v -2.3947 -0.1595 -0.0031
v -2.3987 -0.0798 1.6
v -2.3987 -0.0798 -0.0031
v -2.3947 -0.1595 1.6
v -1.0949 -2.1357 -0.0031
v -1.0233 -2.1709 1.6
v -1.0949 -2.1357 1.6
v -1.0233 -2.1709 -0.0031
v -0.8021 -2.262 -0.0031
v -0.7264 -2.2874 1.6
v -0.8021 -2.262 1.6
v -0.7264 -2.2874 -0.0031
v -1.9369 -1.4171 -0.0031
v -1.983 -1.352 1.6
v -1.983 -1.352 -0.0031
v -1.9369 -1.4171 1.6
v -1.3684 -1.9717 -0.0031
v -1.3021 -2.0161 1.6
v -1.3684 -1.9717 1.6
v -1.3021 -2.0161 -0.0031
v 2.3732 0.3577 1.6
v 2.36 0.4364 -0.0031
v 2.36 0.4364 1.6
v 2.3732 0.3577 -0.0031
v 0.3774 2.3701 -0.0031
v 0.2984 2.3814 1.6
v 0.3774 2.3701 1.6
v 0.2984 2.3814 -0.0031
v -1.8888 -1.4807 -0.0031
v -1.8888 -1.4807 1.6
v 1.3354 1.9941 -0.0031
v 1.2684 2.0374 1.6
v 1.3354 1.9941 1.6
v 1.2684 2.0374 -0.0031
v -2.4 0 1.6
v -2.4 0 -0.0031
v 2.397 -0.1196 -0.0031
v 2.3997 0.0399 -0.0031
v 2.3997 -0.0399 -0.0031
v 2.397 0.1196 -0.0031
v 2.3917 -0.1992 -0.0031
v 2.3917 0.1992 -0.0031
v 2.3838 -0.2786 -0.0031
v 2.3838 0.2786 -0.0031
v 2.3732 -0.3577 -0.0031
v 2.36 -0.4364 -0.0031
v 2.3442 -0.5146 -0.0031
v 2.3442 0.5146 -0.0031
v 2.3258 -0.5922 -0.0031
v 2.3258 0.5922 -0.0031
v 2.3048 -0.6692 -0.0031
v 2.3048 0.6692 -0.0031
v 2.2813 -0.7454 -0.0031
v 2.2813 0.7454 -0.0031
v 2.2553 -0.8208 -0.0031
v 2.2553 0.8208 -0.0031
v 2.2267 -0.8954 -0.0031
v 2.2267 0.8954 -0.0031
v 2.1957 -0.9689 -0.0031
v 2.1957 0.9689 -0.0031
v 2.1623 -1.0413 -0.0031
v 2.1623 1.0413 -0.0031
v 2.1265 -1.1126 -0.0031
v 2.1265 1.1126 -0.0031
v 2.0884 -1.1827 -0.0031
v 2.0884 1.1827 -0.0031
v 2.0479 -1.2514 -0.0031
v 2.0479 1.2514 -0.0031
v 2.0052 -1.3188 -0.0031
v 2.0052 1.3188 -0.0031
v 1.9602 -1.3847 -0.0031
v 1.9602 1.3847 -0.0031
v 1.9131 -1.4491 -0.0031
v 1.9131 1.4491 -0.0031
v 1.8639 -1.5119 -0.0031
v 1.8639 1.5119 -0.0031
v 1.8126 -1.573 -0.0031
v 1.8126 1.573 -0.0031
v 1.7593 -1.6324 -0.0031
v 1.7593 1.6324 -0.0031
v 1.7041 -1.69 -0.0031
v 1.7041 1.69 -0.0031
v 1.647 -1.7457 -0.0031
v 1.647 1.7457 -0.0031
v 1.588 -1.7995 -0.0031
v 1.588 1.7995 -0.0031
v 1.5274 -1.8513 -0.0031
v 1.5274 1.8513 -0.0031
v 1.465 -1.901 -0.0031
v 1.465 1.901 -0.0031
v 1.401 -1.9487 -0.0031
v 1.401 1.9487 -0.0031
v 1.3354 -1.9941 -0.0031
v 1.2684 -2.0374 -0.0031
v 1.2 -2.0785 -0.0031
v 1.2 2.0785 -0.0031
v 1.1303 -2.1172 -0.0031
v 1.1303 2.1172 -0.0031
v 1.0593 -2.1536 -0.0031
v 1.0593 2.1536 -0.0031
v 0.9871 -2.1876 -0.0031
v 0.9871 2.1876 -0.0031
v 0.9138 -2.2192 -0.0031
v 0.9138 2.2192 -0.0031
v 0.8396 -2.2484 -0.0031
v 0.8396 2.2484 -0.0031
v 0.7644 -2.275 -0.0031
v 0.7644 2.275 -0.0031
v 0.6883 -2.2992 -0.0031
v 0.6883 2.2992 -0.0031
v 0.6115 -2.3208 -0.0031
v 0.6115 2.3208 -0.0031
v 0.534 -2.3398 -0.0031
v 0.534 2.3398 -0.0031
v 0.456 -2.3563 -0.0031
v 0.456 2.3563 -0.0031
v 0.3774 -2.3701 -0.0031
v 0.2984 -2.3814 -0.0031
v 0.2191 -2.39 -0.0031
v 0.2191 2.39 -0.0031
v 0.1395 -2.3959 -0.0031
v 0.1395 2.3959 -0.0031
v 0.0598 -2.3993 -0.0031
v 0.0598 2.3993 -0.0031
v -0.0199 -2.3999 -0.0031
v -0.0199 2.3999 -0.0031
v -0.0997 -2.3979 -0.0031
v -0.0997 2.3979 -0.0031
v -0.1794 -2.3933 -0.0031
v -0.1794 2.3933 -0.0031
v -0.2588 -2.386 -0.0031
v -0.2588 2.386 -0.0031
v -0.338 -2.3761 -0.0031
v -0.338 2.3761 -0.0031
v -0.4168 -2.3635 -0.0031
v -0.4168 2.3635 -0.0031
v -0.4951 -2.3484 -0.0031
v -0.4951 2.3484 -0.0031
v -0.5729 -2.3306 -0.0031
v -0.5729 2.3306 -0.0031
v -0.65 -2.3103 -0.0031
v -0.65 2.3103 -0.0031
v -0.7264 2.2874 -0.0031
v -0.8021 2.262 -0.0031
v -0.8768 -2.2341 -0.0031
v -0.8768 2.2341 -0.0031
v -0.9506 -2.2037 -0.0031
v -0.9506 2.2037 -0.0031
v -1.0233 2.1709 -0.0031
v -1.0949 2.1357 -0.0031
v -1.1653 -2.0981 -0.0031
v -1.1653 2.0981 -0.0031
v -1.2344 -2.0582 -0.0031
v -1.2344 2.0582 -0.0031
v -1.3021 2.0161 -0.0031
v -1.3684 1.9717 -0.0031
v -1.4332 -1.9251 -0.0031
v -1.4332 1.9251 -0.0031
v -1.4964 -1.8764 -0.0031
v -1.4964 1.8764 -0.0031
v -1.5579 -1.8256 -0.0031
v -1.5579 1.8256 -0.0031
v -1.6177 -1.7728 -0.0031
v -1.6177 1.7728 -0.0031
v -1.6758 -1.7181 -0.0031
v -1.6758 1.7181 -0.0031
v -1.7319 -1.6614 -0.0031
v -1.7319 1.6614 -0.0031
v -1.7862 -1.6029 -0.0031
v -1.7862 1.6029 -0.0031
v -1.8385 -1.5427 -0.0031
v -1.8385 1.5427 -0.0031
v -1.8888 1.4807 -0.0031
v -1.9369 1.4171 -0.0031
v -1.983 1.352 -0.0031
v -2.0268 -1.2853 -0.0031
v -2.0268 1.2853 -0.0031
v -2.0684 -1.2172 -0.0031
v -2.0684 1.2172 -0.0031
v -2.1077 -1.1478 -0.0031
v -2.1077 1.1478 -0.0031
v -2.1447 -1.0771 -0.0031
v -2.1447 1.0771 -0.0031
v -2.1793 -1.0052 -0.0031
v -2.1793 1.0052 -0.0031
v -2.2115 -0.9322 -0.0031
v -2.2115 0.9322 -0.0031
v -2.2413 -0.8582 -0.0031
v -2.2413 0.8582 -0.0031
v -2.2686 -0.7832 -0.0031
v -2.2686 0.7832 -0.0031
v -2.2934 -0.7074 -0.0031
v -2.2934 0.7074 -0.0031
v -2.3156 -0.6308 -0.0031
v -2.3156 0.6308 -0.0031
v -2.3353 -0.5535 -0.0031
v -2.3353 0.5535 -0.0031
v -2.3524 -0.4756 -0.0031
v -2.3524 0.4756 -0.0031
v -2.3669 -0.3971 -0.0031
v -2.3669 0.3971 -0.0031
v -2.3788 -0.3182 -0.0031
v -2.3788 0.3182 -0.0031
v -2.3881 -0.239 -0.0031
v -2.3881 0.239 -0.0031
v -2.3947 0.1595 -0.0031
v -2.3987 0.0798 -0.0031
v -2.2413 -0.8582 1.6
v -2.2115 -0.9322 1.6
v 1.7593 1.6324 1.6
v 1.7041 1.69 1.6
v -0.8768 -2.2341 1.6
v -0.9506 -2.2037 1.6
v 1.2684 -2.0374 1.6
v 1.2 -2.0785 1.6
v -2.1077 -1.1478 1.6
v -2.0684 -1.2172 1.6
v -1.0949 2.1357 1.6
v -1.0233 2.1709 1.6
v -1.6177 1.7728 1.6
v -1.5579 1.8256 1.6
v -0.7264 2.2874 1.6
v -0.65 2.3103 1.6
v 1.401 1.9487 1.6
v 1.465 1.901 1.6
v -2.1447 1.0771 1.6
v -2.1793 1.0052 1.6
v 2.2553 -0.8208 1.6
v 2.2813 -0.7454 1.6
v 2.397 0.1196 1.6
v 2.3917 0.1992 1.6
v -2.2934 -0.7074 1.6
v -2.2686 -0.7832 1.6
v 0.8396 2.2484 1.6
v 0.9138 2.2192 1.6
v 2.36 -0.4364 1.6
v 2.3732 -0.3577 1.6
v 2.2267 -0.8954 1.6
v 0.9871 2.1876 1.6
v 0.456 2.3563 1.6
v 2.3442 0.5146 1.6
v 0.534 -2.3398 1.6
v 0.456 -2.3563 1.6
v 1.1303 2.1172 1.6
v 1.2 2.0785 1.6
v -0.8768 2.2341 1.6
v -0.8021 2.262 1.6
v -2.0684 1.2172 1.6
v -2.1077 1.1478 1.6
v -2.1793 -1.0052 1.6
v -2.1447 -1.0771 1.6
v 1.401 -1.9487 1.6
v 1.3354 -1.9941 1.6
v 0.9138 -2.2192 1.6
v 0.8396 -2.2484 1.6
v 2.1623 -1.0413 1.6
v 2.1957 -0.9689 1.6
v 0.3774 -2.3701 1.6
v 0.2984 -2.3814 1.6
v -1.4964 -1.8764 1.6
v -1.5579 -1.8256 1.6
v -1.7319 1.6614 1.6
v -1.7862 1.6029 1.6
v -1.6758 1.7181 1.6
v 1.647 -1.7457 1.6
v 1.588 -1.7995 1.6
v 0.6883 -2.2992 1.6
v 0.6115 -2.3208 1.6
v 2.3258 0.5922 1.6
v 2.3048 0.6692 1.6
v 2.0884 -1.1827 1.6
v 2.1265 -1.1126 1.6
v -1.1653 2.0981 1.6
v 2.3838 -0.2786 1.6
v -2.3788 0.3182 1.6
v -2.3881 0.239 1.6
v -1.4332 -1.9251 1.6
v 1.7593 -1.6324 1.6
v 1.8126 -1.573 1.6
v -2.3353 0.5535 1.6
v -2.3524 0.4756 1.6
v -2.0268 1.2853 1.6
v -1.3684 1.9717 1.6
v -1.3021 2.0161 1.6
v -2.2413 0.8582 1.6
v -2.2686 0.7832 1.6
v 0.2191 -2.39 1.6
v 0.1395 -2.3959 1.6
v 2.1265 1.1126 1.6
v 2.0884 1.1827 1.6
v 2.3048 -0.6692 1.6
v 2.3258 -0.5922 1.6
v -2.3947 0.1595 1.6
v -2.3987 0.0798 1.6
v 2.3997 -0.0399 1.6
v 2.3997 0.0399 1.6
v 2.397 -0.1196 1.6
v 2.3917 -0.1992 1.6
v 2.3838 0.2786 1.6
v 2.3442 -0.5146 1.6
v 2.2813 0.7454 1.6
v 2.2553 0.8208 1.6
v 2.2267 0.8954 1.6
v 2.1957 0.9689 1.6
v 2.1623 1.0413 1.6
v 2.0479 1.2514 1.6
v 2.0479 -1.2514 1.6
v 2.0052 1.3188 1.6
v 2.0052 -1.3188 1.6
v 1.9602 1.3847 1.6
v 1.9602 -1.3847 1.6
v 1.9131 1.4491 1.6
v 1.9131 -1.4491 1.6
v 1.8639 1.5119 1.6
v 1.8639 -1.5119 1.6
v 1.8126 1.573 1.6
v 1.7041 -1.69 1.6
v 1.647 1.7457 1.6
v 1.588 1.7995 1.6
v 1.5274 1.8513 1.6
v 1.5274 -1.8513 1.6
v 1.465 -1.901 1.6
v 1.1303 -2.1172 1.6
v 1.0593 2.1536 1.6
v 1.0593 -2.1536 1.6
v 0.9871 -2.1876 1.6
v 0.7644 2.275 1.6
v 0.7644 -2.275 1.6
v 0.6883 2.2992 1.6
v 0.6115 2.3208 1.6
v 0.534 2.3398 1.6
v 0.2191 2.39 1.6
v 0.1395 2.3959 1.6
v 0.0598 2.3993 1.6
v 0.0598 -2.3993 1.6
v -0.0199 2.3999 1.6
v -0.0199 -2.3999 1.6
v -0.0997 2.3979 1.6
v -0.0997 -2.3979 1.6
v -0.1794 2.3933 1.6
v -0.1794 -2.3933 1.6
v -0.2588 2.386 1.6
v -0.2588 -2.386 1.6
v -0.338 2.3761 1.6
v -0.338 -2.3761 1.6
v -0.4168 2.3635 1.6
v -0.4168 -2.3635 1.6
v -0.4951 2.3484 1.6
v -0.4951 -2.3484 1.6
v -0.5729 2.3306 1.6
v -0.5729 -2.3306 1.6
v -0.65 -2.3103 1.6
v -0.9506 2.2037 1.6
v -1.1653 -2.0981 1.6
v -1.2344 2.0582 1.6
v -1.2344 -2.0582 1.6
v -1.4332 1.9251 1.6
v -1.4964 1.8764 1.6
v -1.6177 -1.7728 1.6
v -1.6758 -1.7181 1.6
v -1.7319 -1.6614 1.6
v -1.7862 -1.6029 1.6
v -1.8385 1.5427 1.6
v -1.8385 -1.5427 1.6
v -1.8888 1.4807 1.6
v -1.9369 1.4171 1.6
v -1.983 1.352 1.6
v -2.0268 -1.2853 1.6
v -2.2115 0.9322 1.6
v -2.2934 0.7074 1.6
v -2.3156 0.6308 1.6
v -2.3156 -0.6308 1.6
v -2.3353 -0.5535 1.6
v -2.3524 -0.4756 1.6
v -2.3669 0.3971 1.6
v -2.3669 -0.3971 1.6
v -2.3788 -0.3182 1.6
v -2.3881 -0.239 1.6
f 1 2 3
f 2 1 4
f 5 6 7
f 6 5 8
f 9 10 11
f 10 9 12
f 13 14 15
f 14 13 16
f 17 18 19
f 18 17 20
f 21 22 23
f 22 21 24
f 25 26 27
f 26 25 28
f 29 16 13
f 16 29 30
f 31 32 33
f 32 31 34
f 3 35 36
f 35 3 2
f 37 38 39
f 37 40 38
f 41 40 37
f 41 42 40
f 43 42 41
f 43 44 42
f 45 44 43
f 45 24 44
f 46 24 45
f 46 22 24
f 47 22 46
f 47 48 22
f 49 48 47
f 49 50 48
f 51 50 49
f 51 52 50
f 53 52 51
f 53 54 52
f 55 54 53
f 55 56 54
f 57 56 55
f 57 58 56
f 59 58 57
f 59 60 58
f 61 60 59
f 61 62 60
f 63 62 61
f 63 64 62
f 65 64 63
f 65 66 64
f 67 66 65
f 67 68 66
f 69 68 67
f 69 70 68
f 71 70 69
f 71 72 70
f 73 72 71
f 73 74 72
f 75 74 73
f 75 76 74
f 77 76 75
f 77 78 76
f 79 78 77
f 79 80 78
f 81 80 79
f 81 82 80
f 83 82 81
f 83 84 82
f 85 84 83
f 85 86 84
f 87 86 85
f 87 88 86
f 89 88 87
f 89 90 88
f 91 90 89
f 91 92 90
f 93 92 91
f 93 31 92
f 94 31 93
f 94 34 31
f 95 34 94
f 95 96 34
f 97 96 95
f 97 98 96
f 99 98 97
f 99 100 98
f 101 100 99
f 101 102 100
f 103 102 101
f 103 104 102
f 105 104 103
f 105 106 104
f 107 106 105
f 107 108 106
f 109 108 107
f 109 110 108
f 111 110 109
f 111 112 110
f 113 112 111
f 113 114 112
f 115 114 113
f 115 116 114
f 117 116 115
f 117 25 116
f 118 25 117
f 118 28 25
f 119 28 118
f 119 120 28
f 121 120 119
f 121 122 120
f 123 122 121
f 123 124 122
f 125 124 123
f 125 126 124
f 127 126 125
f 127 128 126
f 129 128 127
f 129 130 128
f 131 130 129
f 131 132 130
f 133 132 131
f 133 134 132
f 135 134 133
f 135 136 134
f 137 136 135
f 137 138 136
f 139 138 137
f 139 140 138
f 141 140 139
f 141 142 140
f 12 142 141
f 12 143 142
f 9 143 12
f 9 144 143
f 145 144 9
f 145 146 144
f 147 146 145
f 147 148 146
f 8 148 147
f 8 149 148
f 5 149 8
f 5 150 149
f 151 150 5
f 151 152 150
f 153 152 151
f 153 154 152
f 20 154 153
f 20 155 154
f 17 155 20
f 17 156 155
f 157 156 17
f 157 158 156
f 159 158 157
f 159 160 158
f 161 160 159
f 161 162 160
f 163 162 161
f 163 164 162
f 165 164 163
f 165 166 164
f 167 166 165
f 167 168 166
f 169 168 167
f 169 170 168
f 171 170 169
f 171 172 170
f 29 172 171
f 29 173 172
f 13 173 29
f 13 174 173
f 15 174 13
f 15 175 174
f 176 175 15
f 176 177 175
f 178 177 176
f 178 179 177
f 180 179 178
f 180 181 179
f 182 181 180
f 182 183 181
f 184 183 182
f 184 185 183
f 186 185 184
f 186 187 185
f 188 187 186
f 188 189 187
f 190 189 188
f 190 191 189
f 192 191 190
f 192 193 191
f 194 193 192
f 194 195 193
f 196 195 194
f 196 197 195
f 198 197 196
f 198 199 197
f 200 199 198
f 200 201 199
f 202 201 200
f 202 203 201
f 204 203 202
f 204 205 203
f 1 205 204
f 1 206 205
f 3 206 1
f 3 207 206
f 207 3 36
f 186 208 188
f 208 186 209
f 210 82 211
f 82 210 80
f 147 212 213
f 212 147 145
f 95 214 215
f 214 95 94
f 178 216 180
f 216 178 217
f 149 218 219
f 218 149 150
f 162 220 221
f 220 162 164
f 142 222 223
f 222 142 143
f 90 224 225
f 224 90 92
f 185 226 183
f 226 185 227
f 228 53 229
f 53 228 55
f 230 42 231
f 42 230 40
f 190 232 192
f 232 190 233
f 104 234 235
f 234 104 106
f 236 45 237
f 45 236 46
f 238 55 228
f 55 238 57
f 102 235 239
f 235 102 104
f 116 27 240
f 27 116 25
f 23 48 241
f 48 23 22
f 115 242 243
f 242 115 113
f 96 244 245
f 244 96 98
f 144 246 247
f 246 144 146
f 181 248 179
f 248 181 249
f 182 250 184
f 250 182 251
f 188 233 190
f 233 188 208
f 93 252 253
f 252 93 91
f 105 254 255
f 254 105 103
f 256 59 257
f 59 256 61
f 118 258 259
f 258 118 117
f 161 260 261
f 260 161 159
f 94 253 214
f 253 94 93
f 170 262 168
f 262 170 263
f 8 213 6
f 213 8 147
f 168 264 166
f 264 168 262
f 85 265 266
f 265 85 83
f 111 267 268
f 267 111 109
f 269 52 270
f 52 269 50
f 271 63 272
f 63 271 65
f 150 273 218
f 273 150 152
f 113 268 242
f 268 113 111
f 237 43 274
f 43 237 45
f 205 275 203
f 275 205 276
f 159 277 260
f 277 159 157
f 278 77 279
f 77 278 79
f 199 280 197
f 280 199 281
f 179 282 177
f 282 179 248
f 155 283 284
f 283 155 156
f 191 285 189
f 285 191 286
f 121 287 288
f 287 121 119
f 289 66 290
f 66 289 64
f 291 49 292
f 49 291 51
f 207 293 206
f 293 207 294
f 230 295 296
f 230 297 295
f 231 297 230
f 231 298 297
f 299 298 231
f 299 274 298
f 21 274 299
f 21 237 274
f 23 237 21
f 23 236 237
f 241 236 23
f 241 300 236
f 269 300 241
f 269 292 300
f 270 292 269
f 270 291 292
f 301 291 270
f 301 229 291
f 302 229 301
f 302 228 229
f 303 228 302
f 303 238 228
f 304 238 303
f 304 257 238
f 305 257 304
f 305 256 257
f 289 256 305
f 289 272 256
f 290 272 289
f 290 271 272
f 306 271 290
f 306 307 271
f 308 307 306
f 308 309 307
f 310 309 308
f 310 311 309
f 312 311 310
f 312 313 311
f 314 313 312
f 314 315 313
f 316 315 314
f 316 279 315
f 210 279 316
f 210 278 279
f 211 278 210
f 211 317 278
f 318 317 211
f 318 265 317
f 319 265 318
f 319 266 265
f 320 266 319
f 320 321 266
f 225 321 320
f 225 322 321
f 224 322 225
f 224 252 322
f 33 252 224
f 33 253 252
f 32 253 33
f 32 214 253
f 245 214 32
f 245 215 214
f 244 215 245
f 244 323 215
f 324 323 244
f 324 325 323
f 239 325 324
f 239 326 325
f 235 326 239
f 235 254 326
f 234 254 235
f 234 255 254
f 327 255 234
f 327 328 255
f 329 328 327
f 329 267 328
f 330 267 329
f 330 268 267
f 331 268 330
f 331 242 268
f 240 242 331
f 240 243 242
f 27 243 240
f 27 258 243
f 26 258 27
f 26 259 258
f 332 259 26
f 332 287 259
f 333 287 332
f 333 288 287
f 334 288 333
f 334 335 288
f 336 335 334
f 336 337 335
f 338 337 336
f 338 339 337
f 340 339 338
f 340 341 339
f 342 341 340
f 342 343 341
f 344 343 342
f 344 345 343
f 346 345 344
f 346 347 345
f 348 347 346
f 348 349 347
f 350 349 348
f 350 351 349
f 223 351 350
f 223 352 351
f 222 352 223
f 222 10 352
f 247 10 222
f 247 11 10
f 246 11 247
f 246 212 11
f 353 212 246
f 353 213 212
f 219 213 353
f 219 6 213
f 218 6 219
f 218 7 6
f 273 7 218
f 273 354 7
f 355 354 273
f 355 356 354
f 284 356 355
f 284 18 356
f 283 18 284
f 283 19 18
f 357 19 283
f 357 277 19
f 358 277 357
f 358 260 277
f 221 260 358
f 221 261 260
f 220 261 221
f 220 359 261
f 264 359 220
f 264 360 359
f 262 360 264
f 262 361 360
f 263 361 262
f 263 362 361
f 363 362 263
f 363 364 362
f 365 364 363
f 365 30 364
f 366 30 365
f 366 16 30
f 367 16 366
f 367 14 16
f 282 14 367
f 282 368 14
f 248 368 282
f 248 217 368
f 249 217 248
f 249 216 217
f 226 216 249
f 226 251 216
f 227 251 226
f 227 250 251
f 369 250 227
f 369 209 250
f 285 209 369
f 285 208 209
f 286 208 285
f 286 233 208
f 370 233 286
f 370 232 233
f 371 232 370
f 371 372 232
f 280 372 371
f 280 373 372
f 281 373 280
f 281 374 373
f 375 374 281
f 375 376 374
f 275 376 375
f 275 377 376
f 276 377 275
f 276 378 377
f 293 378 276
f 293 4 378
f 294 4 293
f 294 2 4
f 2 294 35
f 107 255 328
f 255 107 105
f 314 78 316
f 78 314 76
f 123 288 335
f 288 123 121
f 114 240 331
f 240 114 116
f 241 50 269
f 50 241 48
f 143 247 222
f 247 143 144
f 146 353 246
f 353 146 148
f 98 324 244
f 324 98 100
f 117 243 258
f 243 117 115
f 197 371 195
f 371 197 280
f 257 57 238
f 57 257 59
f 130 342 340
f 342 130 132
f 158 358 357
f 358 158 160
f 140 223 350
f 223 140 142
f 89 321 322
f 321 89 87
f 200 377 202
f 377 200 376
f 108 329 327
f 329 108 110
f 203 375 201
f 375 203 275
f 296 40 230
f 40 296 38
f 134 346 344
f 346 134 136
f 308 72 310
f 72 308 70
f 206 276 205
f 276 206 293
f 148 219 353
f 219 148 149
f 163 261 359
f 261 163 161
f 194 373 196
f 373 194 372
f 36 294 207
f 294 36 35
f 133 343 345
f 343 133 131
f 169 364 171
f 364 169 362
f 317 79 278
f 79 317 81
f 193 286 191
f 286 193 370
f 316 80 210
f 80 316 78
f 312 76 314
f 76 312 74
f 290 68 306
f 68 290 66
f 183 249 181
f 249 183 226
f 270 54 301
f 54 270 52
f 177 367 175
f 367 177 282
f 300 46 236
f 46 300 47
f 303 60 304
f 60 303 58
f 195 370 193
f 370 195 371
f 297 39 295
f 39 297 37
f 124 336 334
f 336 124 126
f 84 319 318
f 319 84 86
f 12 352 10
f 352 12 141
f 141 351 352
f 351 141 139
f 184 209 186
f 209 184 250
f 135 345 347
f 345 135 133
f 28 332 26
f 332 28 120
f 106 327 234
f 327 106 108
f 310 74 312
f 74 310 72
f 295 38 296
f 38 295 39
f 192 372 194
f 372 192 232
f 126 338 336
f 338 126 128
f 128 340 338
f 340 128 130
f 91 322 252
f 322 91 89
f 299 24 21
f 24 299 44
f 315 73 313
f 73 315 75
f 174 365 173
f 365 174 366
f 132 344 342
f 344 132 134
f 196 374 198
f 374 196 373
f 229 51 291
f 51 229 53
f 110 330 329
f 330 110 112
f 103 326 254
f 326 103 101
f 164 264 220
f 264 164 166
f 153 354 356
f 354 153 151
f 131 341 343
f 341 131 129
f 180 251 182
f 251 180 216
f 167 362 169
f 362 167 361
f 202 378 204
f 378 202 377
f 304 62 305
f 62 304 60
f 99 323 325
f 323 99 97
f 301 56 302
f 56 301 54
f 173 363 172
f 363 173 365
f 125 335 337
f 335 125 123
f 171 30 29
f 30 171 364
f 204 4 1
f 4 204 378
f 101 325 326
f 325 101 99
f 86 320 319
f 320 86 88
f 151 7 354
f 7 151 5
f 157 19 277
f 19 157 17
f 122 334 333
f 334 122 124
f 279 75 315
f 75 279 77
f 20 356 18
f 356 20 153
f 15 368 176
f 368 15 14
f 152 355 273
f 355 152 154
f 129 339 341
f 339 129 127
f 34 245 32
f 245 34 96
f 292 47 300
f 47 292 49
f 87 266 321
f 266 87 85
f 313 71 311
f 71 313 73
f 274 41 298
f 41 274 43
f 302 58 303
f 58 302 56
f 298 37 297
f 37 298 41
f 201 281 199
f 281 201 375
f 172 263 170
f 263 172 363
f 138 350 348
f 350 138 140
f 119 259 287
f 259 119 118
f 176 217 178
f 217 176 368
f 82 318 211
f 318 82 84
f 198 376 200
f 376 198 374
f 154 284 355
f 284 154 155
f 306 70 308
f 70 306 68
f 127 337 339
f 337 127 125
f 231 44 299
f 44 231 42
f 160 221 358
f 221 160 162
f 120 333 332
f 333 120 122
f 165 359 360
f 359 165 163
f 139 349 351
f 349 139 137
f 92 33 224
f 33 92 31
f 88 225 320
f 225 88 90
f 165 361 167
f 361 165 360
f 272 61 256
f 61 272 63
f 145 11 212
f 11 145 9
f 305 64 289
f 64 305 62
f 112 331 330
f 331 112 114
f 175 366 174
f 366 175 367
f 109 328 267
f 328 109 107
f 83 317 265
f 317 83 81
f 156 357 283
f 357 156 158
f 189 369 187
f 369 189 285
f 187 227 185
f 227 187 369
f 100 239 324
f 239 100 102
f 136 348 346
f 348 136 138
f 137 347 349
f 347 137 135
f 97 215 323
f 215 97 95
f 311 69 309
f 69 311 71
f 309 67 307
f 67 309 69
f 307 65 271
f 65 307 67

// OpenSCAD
// file: ../p/4-4edge.scad
use <../lib.scad>
$fa=1; $fs=0.2;
function ldraw_lib__4_4edge(realsolid=false) = [
// 0 Circle 1.0
// 0 Name: 4-4edge.dat
// 0 Author: James Jessiman
// 0 !LDRAW_ORG Primitive UPDATE 2017-01
// 0 !LICENSE Licensed under CC BY 2.0 and CC BY 4.0 : see CAreadme.txt
// 
// 0 BFC CERTIFY CCW
  [0,"BFC","CERTIFY"],
  [0,"BFC","CCW"],
// 
// 0 !HISTORY 1998-12-15 [PTadmin] Official Update 1998-10
// 0 !HISTORY 2005-12-28 [PTadmin] Official Update 2005-01
// 0 !HISTORY 2007-06-24 [PTadmin] Header formatted for Contributor Agreement
// 0 !HISTORY 2008-07-01 [PTadmin] Official Update 2008-01
// 0 !HISTORY 2017-01-15 [Steffen] BFCed
// 0 !HISTORY 2017-12-30 [PTadmin] Official Update 2017-01
// 
// 
// 2 24 1 0 0 0.9239 0 0.3827
  [2,24,1,0,0,0.9239,0,0.3827],
// 2 24 0.9239 0 0.3827 0.7071 0 0.7071
  [2,24,0.9239,0,0.3827,0.7071,0,0.7071],
// 2 24 0.7071 0 0.7071 0.3827 0 0.9239
  [2,24,0.7071,0,0.7071,0.3827,0,0.9239],
// 2 24 0.3827 0 0.9239 0 0 1
  [2,24,0.3827,0,0.9239,0,0,1],
// 2 24 0 0 1 -0.3827 0 0.9239
  [2,24,0,0,1,-0.3827,0,0.9239],
// 2 24 -0.3827 0 0.9239 -0.7071 0 0.7071
  [2,24,-0.3827,0,0.9239,-0.7071,0,0.7071],
// 2 24 -0.7071 0 0.7071 -0.9239 0 0.3827
  [2,24,-0.7071,0,0.7071,-0.9239,0,0.3827],
// 2 24 -0.9239 0 0.3827 -1 0 -0
  [2,24,-0.9239,0,0.3827,-1,0,-0],
// 2 24 -1 0 -0 -0.9239 0 -0.3827
  [2,24,-1,0,-0,-0.9239,0,-0.3827],
// 2 24 -0.9239 0 -0.3827 -0.7071 0 -0.7071
  [2,24,-0.9239,0,-0.3827,-0.7071,0,-0.7071],
// 2 24 -0.7071 0 -0.7071 -0.3827 0 -0.9239
  [2,24,-0.7071,0,-0.7071,-0.3827,0,-0.9239],
// 2 24 -0.3827 0 -0.9239 0 0 -1
  [2,24,-0.3827,0,-0.9239,0,0,-1],
// 2 24 0 0 -1 0.3827 0 -0.9239
  [2,24,0,0,-1,0.3827,0,-0.9239],
// 2 24 0.3827 0 -0.9239 0.7071 0 -0.7071
  [2,24,0.3827,0,-0.9239,0.7071,0,-0.7071],
// 2 24 0.7071 0 -0.7071 0.9239 0 -0.3827
  [2,24,0.7071,0,-0.7071,0.9239,0,-0.3827],
// 2 24 0.9239 0 -0.3827 1 0 0
  [2,24,0.9239,0,-0.3827,1,0,0],
];
module ldraw_lib__4_4edge(step=0, col=false, unit=2/5, alt=false, line=0.2, solid=!$preview)
    makepoly(ldraw_lib__4_4edge(solid), step=step, col=col, unit=unit, alt=alt, line=line, solid=solid);
ldraw_lib__4_4edge(line=0.2);
// file: ../p/4-4disc.scad
use <../lib.scad>
$fa=1; $fs=0.2;
function ldraw_lib__4_4disc(realsolid=false) = [
// 0 Disc 1.0
// 0 Name: 4-4disc.dat
// 0 Author: James Jessiman
// 0 !LDRAW_ORG Primitive UPDATE 2002-02
// 0 !LICENSE Licensed under CC BY 2.0 and CC BY 4.0 : see CAreadme.txt
// 
// 0 BFC CERTIFY CCW
  [0,"BFC","CERTIFY"],
  [0,"BFC","CCW"],
// 
// 0 !HISTORY 1998-12-15 [PTadmin] Official Update 1998-10
// 0 !HISTORY 2002-03-23 [sbliss] Added BFC statement
// 0 !HISTORY 2002-04-25 [PTadmin] Official Update 2002-02
// 0 !HISTORY 2007-06-24 [PTadmin] Header formatted for Contributor Agreement
// 0 !HISTORY 2008-07-01 [PTadmin] Official Update 2008-01
// 
// 
// 3 16 0 0 0 1 0 0 0.9239 0 0.3827
  [3,16,0,0,0,1,0,0,0.9239,0,0.3827],
// 3 16 0 0 0 0.9239 0 0.3827 0.7071 0 0.7071
  [3,16,0,0,0,0.9239,0,0.3827,0.7071,0,0.7071],
// 3 16 0 0 0 0.7071 0 0.7071 0.3827 0 0.9239
  [3,16,0,0,0,0.7071,0,0.7071,0.3827,0,0.9239],
// 3 16 0 0 0 0.3827 0 0.9239 0 0 1
  [3,16,0,0,0,0.3827,0,0.9239,0,0,1],
// 3 16 0 0 0 0 0 1 -0.3827 0 0.9239
  [3,16,0,0,0,0,0,1,-0.3827,0,0.9239],
// 3 16 0 0 0 -0.3827 0 0.9239 -0.7071 0 0.7071
  [3,16,0,0,0,-0.3827,0,0.9239,-0.7071,0,0.7071],
// 3 16 0 0 0 -0.7071 0 0.7071 -0.9239 0 0.3827
  [3,16,0,0,0,-0.7071,0,0.7071,-0.9239,0,0.3827],
// 3 16 0 0 0 -0.9239 0 0.3827 -1 0 -0
  [3,16,0,0,0,-0.9239,0,0.3827,-1,0,-0],
// 3 16 0 0 0 -1 0 -0 -0.9239 0 -0.3827
  [3,16,0,0,0,-1,0,-0,-0.9239,0,-0.3827],
// 3 16 0 0 0 -0.9239 0 -0.3827 -0.7071 0 -0.7071
  [3,16,0,0,0,-0.9239,0,-0.3827,-0.7071,0,-0.7071],
// 3 16 0 0 0 -0.7071 0 -0.7071 -0.3827 0 -0.9239
  [3,16,0,0,0,-0.7071,0,-0.7071,-0.3827,0,-0.9239],
// 3 16 0 0 0 -0.3827 0 -0.9239 0 0 -1
  [3,16,0,0,0,-0.3827,0,-0.9239,0,0,-1],
// 3 16 0 0 0 0 0 -1 0.3827 0 -0.9239
  [3,16,0,0,0,0,0,-1,0.3827,0,-0.9239],
// 3 16 0 0 0 0.3827 0 -0.9239 0.7071 0 -0.7071
  [3,16,0,0,0,0.3827,0,-0.9239,0.7071,0,-0.7071],
// 3 16 0 0 0 0.7071 0 -0.7071 0.9239 0 -0.3827
  [3,16,0,0,0,0.7071,0,-0.7071,0.9239,0,-0.3827],
// 3 16 0 0 0 0.9239 0 -0.3827 1 0 0
  [3,16,0,0,0,0.9239,0,-0.3827,1,0,0],
// 0
];
module ldraw_lib__4_4disc(step=0, col=false, unit=2/5, alt=false, line=0.2, solid=!$preview)
    makepoly(ldraw_lib__4_4disc(solid), step=step, col=col, unit=unit, alt=alt, line=line, solid=solid);
ldraw_lib__4_4disc(line=0.2);
// file: ../p/4-4cyli.scad
use <../lib.scad>
$fa=1; $fs=0.2;
function ldraw_lib__4_4cyli(realsolid=false) = [
// 0 Cylinder 1.0
// 0 Name: 4-4cyli.dat
// 0 Author: James Jessiman
// 0 !LDRAW_ORG Primitive UPDATE 2005-01
// 0 !LICENSE Licensed under CC BY 2.0 and CC BY 4.0 : see CAreadme.txt
// 
// 0 BFC CERTIFY CCW
  [0,"BFC","CERTIFY"],
  [0,"BFC","CCW"],
// 
// 0 !HISTORY 1998-12-15 [PTadmin] Official Update 1998-10
// 0 !HISTORY 2002-03-23 [sbliss] Added BFC statement; merged headers from files in distributions LDraw 0.27 and Complete.
// 0 !HISTORY 2002-04-25 [PTadmin] Official Update 2002-02
// 0 !HISTORY 2004-12-14 [guyvivan] BFC CCW
// 0 !HISTORY 2005-12-28 [PTadmin] Official Update 2005-01
// 0 !HISTORY 2007-06-24 [PTadmin] Header formatted for Contributor Agreement
// 0 !HISTORY 2008-07-01 [PTadmin] Official Update 2008-01
// 
// 
// 4 16 1 1 0 0.9239 1 0.3827 0.9239 0 0.3827 1 0 0
  [4,16,1,1,0,0.9239,1,0.3827,0.9239,0,0.3827,1,0,0],
// 5 24 1 0 0 1 1 0 0.9239 0 0.3827 0.9239 0 -0.3827
  [5,24,1,0,0,1,1,0,0.9239,0,0.3827,0.9239,0,-0.3827],
// 4 16 0.9239 1 0.3827 0.7071 1 0.7071 0.7071 0 0.7071 0.9239 0 0.3827
  [4,16,0.9239,1,0.3827,0.7071,1,0.7071,0.7071,0,0.7071,0.9239,0,0.3827],
// 5 24 0.9239 0 0.3827 0.9239 1 0.3827 0.7071 0 0.7071 1 0 0
  [5,24,0.9239,0,0.3827,0.9239,1,0.3827,0.7071,0,0.7071,1,0,0],
// 4 16 0.7071 1 0.7071 0.3827 1 0.9239 0.3827 0 0.9239 0.7071 0 0.7071
  [4,16,0.7071,1,0.7071,0.3827,1,0.9239,0.3827,0,0.9239,0.7071,0,0.7071],
// 5 24 0.7071 0 0.7071 0.7071 1 0.7071 0.3827 0 0.9239 0.9239 0 0.3827
  [5,24,0.7071,0,0.7071,0.7071,1,0.7071,0.3827,0,0.9239,0.9239,0,0.3827],
// 4 16 0.3827 1 0.9239 0 1 1 0 0 1 0.3827 0 0.9239
  [4,16,0.3827,1,0.9239,0,1,1,0,0,1,0.3827,0,0.9239],
// 5 24 0.3827 0 0.9239 0.3827 1 0.9239 0 0 1 0.7071 0 0.7071
  [5,24,0.3827,0,0.9239,0.3827,1,0.9239,0,0,1,0.7071,0,0.7071],
// 4 16 0 1 1 -0.3827 1 0.9239 -0.3827 0 0.9239 0 0 1
  [4,16,0,1,1,-0.3827,1,0.9239,-0.3827,0,0.9239,0,0,1],
// 5 24 0 0 1 0 1 1 -0.3827 0 0.9239 0.3827 0 0.9239
  [5,24,0,0,1,0,1,1,-0.3827,0,0.9239,0.3827,0,0.9239],
// 4 16 -0.3827 1 0.9239 -0.7071 1 0.7071 -0.7071 0 0.7071 -0.3827 0 0.9239
  [4,16,-0.3827,1,0.9239,-0.7071,1,0.7071,-0.7071,0,0.7071,-0.3827,0,0.9239],
// 5 24 -0.3827 0 0.9239 -0.3827 1 0.9239 -0.7071 0 0.7071 0 0 1
  [5,24,-0.3827,0,0.9239,-0.3827,1,0.9239,-0.7071,0,0.7071,0,0,1],
// 4 16 -0.7071 1 0.7071 -0.9239 1 0.3827 -0.9239 0 0.3827 -0.7071 0 0.7071
  [4,16,-0.7071,1,0.7071,-0.9239,1,0.3827,-0.9239,0,0.3827,-0.7071,0,0.7071],
// 5 24 -0.7071 0 0.7071 -0.7071 1 0.7071 -0.9239 0 0.3827 -0.3827 0 0.9239
  [5,24,-0.7071,0,0.7071,-0.7071,1,0.7071,-0.9239,0,0.3827,-0.3827,0,0.9239],
// 4 16 -0.9239 1 0.3827 -1 1 0 -1 0 0 -0.9239 0 0.3827
  [4,16,-0.9239,1,0.3827,-1,1,0,-1,0,0,-0.9239,0,0.3827],
// 5 24 -0.9239 0 0.3827 -0.9239 1 0.3827 -1 0 0 -0.7071 0 0.7071
  [5,24,-0.9239,0,0.3827,-0.9239,1,0.3827,-1,0,0,-0.7071,0,0.7071],
// 4 16 -1 1 0 -0.9239 1 -0.3827 -0.9239 0 -0.3827 -1 0 0
  [4,16,-1,1,0,-0.9239,1,-0.3827,-0.9239,0,-0.3827,-1,0,0],
// 5 24 -1 0 0 -1 1 0 -0.9239 0 -0.3827 -0.9239 0 0.3827
  [5,24,-1,0,0,-1,1,0,-0.9239,0,-0.3827,-0.9239,0,0.3827],
// 4 16 -0.9239 1 -0.3827 -0.7071 1 -0.7071 -0.7071 0 -0.7071 -0.9239 0 -0.3827
  [4,16,-0.9239,1,-0.3827,-0.7071,1,-0.7071,-0.7071,0,-0.7071,-0.9239,0,-0.3827],
// 5 24 -0.9239 0 -0.3827 -0.9239 1 -0.3827 -0.7071 0 -0.7071 -1 0 0
  [5,24,-0.9239,0,-0.3827,-0.9239,1,-0.3827,-0.7071,0,-0.7071,-1,0,0],
// 4 16 -0.7071 1 -0.7071 -0.3827 1 -0.9239 -0.3827 0 -0.9239 -0.7071 0 -0.7071
  [4,16,-0.7071,1,-0.7071,-0.3827,1,-0.9239,-0.3827,0,-0.9239,-0.7071,0,-0.7071],
// 5 24 -0.7071 0 -0.7071 -0.7071 1 -0.7071 -0.3827 0 -0.9239 -0.9239 0 -0.3827
  [5,24,-0.7071,0,-0.7071,-0.7071,1,-0.7071,-0.3827,0,-0.9239,-0.9239,0,-0.3827],
// 4 16 -0.3827 1 -0.9239 0 1 -1 0 0 -1 -0.3827 0 -0.9239
  [4,16,-0.3827,1,-0.9239,0,1,-1,0,0,-1,-0.3827,0,-0.9239],
// 5 24 -0.3827 0 -0.9239 -0.3827 1 -0.9239 0 0 -1 -0.7071 0 -0.7071
  [5,24,-0.3827,0,-0.9239,-0.3827,1,-0.9239,0,0,-1,-0.7071,0,-0.7071],
// 4 16 0 1 -1 0.3827 1 -0.9239 0.3827 0 -0.9239 0 0 -1
  [4,16,0,1,-1,0.3827,1,-0.9239,0.3827,0,-0.9239,0,0,-1],
// 5 24 0 0 -1 0 1 -1 0.3827 0 -0.9239 -0.3827 0 -0.9239
  [5,24,0,0,-1,0,1,-1,0.3827,0,-0.9239,-0.3827,0,-0.9239],
// 4 16 0.3827 1 -0.9239 0.7071 1 -0.7071 0.7071 0 -0.7071 0.3827 0 -0.9239
  [4,16,0.3827,1,-0.9239,0.7071,1,-0.7071,0.7071,0,-0.7071,0.3827,0,-0.9239],
// 5 24 0.3827 0 -0.9239 0.3827 1 -0.9239 0.7071 0 -0.7071 0 0 -1
  [5,24,0.3827,0,-0.9239,0.3827,1,-0.9239,0.7071,0,-0.7071,0,0,-1],
// 4 16 0.7071 1 -0.7071 0.9239 1 -0.3827 0.9239 0 -0.3827 0.7071 0 -0.7071
  [4,16,0.7071,1,-0.7071,0.9239,1,-0.3827,0.9239,0,-0.3827,0.7071,0,-0.7071],
// 5 24 0.7071 0 -0.7071 0.7071 1 -0.7071 0.9239 0 -0.3827 0.3827 0 -0.9239
  [5,24,0.7071,0,-0.7071,0.7071,1,-0.7071,0.9239,0,-0.3827,0.3827,0,-0.9239],
// 4 16 0.9239 1 -0.3827 1 1 0 1 0 0 0.9239 0 -0.3827
  [4,16,0.9239,1,-0.3827,1,1,0,1,0,0,0.9239,0,-0.3827],
// 5 24 0.9239 0 -0.3827 0.9239 1 -0.3827 1 0 0 0.7071 0 -0.7071
  [5,24,0.9239,0,-0.3827,0.9239,1,-0.3827,1,0,0,0.7071,0,-0.7071],
// 0
];
module ldraw_lib__4_4cyli(step=0, col=false, unit=2/5, alt=false, line=0.2, solid=!$preview)
    makepoly(ldraw_lib__4_4cyli(solid), step=step, col=col, unit=unit, alt=alt, line=line, solid=solid);
ldraw_lib__4_4cyli(line=0.2);
// file: ../p/stud3.scad
use <../lib.scad>
use <4-4cyli.scad>
use <4-4disc.scad>
use <4-4edge.scad>
$fa=1; $fs=0.2;
function ldraw_lib__stud3(realsolid=false) = realsolid ? 
    [openscad(translate([0,0,-eps()], o=cylinder(4+eps(), r=4)),2)] : [
// 0 Stud Tube Solid
// 0 Name: stud3.dat
// 0 Author: James Jessiman
// 0 !LDRAW_ORG Primitive UPDATE 2012-01
// 0 !LICENSE Licensed under CC BY 2.0 and CC BY 4.0 : see CAreadme.txt
// 
// 0 BFC CERTIFY CCW
  [0,"BFC","CERTIFY"],
  [0,"BFC","CCW"],
// 
// 0 !HISTORY 2002-04-04 [sbliss] Modified for BFC compliance
// 0 !HISTORY 2002-04-25 [PTadmin] Official Update 2002-02
// 0 !HISTORY 2007-06-24 [PTadmin] Header formatted for Contributor Agreement
// 0 !HISTORY 2008-07-01 [PTadmin] Official Update 2008-01
// 0 !HISTORY 2012-02-16 [Philo] Changed to CCW
// 0 !HISTORY 2012-03-30 [PTadmin] Official Update 2012-01
// 
// 
// 1 16 0 -4 0 4 0 0 0 1 0 0 0 4 4-4edge.dat
  [1,16,0,-4,0,4,0,0,0,1,0,0,0,4, ldraw_lib__4_4edge(realsolid)],
// 1 16 0 0 0 4 0 0 0 1 0 0 0 4 4-4edge.dat
  [1,16,0,0,0,4,0,0,0,1,0,0,0,4, ldraw_lib__4_4edge(realsolid)],
// 1 16 0 -4 0 4 0 0 0 1 0 0 0 4 4-4disc.dat
  [1,16,0,-4,0,4,0,0,0,1,0,0,0,4, ldraw_lib__4_4disc(realsolid)],
// 1 16 0 -4 0 4 0 0 0 4 0 0 0 4 4-4cyli.dat
  [1,16,0,-4,0,4,0,0,0,4,0,0,0,4, ldraw_lib__4_4cyli(realsolid)],
];
module ldraw_lib__stud3(step=0, col=false, unit=2/5, alt=false, line=0.2, solid=!$preview)
    makepoly(ldraw_lib__stud3(solid), step=step, col=col, unit=unit, alt=alt, line=line, solid=solid);
ldraw_lib__stud3(line=0.2);
// file: ../p/stud.scad
use <../lib.scad>
use <4-4cyli.scad>
use <4-4disc.scad>
use <4-4edge.scad>
$fa=1; $fs=0.2;
function ldraw_lib__stud(realsolid=false) = realsolid ? 
    [openscad(translate([0,0,-eps()], o=cylinder(4+eps(), r=6)),2)] : [
// 0 Stud
// 0 Name: stud.dat
// 0 Author: James Jessiman
// 0 !LDRAW_ORG Primitive UPDATE 2012-01
// 0 !LICENSE Licensed under CC BY 2.0 and CC BY 4.0 : see CAreadme.txt
// 
// 0 BFC CERTIFY CCW
  [0,"BFC","CERTIFY"],
  [0,"BFC","CCW"],
// 
// 0 !HISTORY 2002-04-04 [sbliss] Modified for BFC compliance
// 0 !HISTORY 2002-04-25 [PTadmin] Official Update 2002-02
// 0 !HISTORY 2007-06-24 [PTadmin] Header formatted for Contributor Agreement
// 0 !HISTORY 2008-07-01 [PTadmin] Official Update 2008-01
// 0 !HISTORY 2012-02-16 [Philo] Changed to CCW
// 0 !HISTORY 2012-03-30 [PTadmin] Official Update 2012-01
// 
// 
// 1 16 0 0 0 6 0 0 0 1 0 0 0 6 4-4edge.dat
  [1,16,0,0,0,6,0,0,0,1,0,0,0,6, ldraw_lib__4_4edge(realsolid)],
// 1 16 0 -4 0 6 0 0 0 1 0 0 0 6 4-4edge.dat
  [1,16,0,-4,0,6,0,0,0,1,0,0,0,6, ldraw_lib__4_4edge(realsolid)],
// 1 16 0 0 0 6 0 0 0 -4 0 0 0 6 4-4cyli.dat
  [1,16,0,0,0,6,0,0,0,-4,0,0,0,6, ldraw_lib__4_4cyli(realsolid)],
// 1 16 0 -4 0 6 0 0 0 1 0 0 0 6 4-4disc.dat
  [1,16,0,-4,0,6,0,0,0,1,0,0,0,6, ldraw_lib__4_4disc(realsolid)],
];
module ldraw_lib__stud(step=0, col=false, unit=2/5, alt=false, line=0.2, solid=!$preview)
    makepoly(ldraw_lib__stud(solid), step=step, col=col, unit=unit, alt=alt, line=line, solid=solid);
ldraw_lib__stud(line=0.2);
// file: ../p/box5.scad
use <../lib.scad>
$fa=1; $fs=0.2;
function ldraw_lib__box5(realsolid=false) = [
// 0 Box with 5 Faces and All Edges
// 0 Name: box5.dat
// 0 Author: James Jessiman
// 0 !LDRAW_ORG Primitive UPDATE 2012-01
// 0 !LICENSE Licensed under CC BY 2.0 and CC BY 4.0 : see CAreadme.txt
// 
// 0 BFC CERTIFY CCW
  [0,"BFC","CERTIFY"],
  [0,"BFC","CCW"],
// 
// 0 !HISTORY 2002-04-03 [sbliss] Modified for BFC compliance
// 0 !HISTORY 2002-04-25 [PTadmin] Official Update 2002-02
// 0 !HISTORY 2007-06-24 [PTadmin] Header formatted for Contributor Agreement
// 0 !HISTORY 2008-07-01 [PTadmin] Official Update 2008-01
// 0 !HISTORY 2012-02-16 [Philo] Changed to CCW
// 0 !HISTORY 2012-03-30 [PTadmin] Official Update 2012-01
// 
// 
// 2 24 1 1 1 -1 1 1
  [2,24,1,1,1,-1,1,1],
// 2 24 -1 1 1 -1 1 -1
  [2,24,-1,1,1,-1,1,-1],
// 2 24 -1 1 -1 1 1 -1
  [2,24,-1,1,-1,1,1,-1],
// 2 24 1 1 -1 1 1 1
  [2,24,1,1,-1,1,1,1],
// 2 24 1 0 1 -1 0 1
  [2,24,1,0,1,-1,0,1],
// 2 24 -1 0 1 -1 0 -1
  [2,24,-1,0,1,-1,0,-1],
// 2 24 -1 0 -1 1 0 -1
  [2,24,-1,0,-1,1,0,-1],
// 2 24 1 0 -1 1 0 1
  [2,24,1,0,-1,1,0,1],
// 2 24 1 0 1 1 1 1
  [2,24,1,0,1,1,1,1],
// 2 24 -1 0 1 -1 1 1
  [2,24,-1,0,1,-1,1,1],
// 2 24 1 0 -1 1 1 -1
  [2,24,1,0,-1,1,1,-1],
// 2 24 -1 0 -1 -1 1 -1
  [2,24,-1,0,-1,-1,1,-1],
// 4 16 -1 1 1 1 1 1 1 1 -1 -1 1 -1
  [4,16,-1,1,1,1,1,1,1,1,-1,-1,1,-1],
// 4 16 -1 1 1 -1 0 1 1 0 1 1 1 1
  [4,16,-1,1,1,-1,0,1,1,0,1,1,1,1],
// 4 16 -1 1 -1 -1 0 -1 -1 0 1 -1 1 1
  [4,16,-1,1,-1,-1,0,-1,-1,0,1,-1,1,1],
// 4 16 1 1 -1 1 0 -1 -1 0 -1 -1 1 -1
  [4,16,1,1,-1,1,0,-1,-1,0,-1,-1,1,-1],
// 4 16 1 1 1 1 0 1 1 0 -1 1 1 -1
  [4,16,1,1,1,1,0,1,1,0,-1,1,1,-1],
];
module ldraw_lib__box5(step=0, col=false, unit=2/5, alt=false, line=0.2, solid=!$preview)
    makepoly(ldraw_lib__box5(solid), step=step, col=col, unit=unit, alt=alt, line=line, solid=solid);
ldraw_lib__box5(line=0.2);
// file: ../p/box4t.scad
use <../lib.scad>
$fa=1; $fs=0.2;
function ldraw_lib__box4t(realsolid=false) = [
// 0 Box with 4 Adjacent Faces and All Edges
// 0 Name: box4t.dat
// 0 Author: Tore Eriksson [Tore_Eriksson]
// 0 !LDRAW_ORG Primitive UPDATE 2003-02
// 0 !LICENSE Licensed under CC BY 2.0 and CC BY 4.0 : see CAreadme.txt
// 
// 0 BFC CERTIFY CCW
  [0,"BFC","CERTIFY"],
  [0,"BFC","CCW"],
// 
// 0 !HISTORY 1997-09-29 [PTadmin] Official Update 1997-15
// 0 !HISTORY 2002-08-31 [izanette] Modified with WINDZ for BFC compliance
// 0 !HISTORY 2003-08-01 [PTadmin] Official Update 2003-02
// 0 !HISTORY 2007-06-24 [PTadmin] Header formatted for Contributor Agreement
// 0 !HISTORY 2008-07-01 [PTadmin] Official Update 2008-01
// 
// 
// 2 24 1 1 1 -1 1 1
  [2,24,1,1,1,-1,1,1],
// 2 24 -1 1 1 -1 1 -1
  [2,24,-1,1,1,-1,1,-1],
// 2 24 -1 1 -1 1 1 -1
  [2,24,-1,1,-1,1,1,-1],
// 2 24 1 1 -1 1 1 1
  [2,24,1,1,-1,1,1,1],
// 2 24 1 0 1 -1 0 1
  [2,24,1,0,1,-1,0,1],
// 2 24 -1 0 1 -1 0 -1
  [2,24,-1,0,1,-1,0,-1],
// 2 24 -1 0 -1 1 0 -1
  [2,24,-1,0,-1,1,0,-1],
// 2 24 1 0 -1 1 0 1
  [2,24,1,0,-1,1,0,1],
// 2 24 1 0 1 1 1 1
  [2,24,1,0,1,1,1,1],
// 2 24 -1 0 1 -1 1 1
  [2,24,-1,0,1,-1,1,1],
// 2 24 1 0 -1 1 1 -1
  [2,24,1,0,-1,1,1,-1],
// 2 24 -1 0 -1 -1 1 -1
  [2,24,-1,0,-1,-1,1,-1],
// 4 16 1 1 1 1 1 -1 -1 1 -1 -1 1 1
  [4,16,1,1,1,1,1,-1,-1,1,-1,-1,1,1],
// 4 16 1 1 1 -1 1 1 -1 0 1 1 0 1
  [4,16,1,1,1,-1,1,1,-1,0,1,1,0,1],
// 4 16 -1 1 1 -1 1 -1 -1 0 -1 -1 0 1
  [4,16,-1,1,1,-1,1,-1,-1,0,-1,-1,0,1],
// 0 4 16 -1 1 -1 -1 0 -1 1 0 -1 1 1 -1
// 4 16 1 1 -1 1 1 1 1 0 1 1 0 -1
  [4,16,1,1,-1,1,1,1,1,0,1,1,0,-1],
// 0
];
module ldraw_lib__box4t(step=0, col=false, unit=2/5, alt=false, line=0.2, solid=!$preview)
    makepoly(ldraw_lib__box4t(solid), step=step, col=col, unit=unit, alt=alt, line=line, solid=solid);
ldraw_lib__box4t(line=0.2);
// file: s/3004s01.scad
use <../../lib.scad>
use <../../p/box4t.scad>
use <../../p/box5.scad>
use <../../p/stud.scad>
use <../../p/stud3.scad>
$fa=1; $fs=0.2;
function ldraw_lib__s__3004s01(realsolid=false) = [
// 0 ~Brick  1 x  2 without Front Face
// 0 Name: s\3004s01.dat
// 0 Author: James Jessiman
// 0 !LDRAW_ORG Subpart UPDATE 2003-03
// 0 !LICENSE Licensed under CC BY 2.0 and CC BY 4.0 : see CAreadme.txt
// 
// 0 BFC CERTIFY CCW
  [0,"BFC","CERTIFY"],
  [0,"BFC","CCW"],
// 
// 0 !HISTORY 2003-09-07 [jriley] Subfiling, BFC
// 0 !HISTORY 2003-12-19 [PTadmin] Official Update 2003-03
// 0 !HISTORY 2007-08-29 [PTadmin] Header formatted for Contributor Agreement
// 0 !HISTORY 2008-07-01 [PTadmin] Official Update 2008-01
// 
// 
// 1 16 0 4 0 1 0 0 0 -5 0 0 0 1 stud3.dat
  [1,16,0,4,0,1,0,0,0,-5,0,0,0,1, ldraw_lib__stud3(realsolid)],
// 0 BFC INVERTNEXT
  [0,"BFC","INVERTNEXT"],
// 1 16 0 24 0 16 0 0 0 -20 0 0 0 6 box5.dat
  [1,16,0,24,0,16,0,0,0,-20,0,0,0,6, ldraw_lib__box5(realsolid)],
// 4 16 20 24 10 16 24 6 -16 24 6 -20 24 10
  [4,16,20,24,10,16,24,6,-16,24,6,-20,24,10],
// 4 16 -20 24 10 -16 24 6 -16 24 -6 -20 24 -10
  [4,16,-20,24,10,-16,24,6,-16,24,-6,-20,24,-10],
// 4 16 -20 24 -10 -16 24 -6 16 24 -6 20 24 -10
  [4,16,-20,24,-10,-16,24,-6,16,24,-6,20,24,-10],
// 4 16 20 24 -10 16 24 -6 16 24 6 20 24 10
  [4,16,20,24,-10,16,24,-6,16,24,6,20,24,10],
// 1 16 0 24 0 20 0 0 0 -24 0 0 0 10 box4t.dat
  [1,16,0,24,0,20,0,0,0,-24,0,0,0,10, ldraw_lib__box4t(realsolid)],
// 1 16 10 0 0 1 0 0 0 1 0 0 0 1 stud.dat
  [1,16,10,0,0,1,0,0,0,1,0,0,0,1, ldraw_lib__stud(realsolid)],
// 1 16 -10 0 0 1 0 0 0 1 0 0 0 1 stud.dat
  [1,16,-10,0,0,1,0,0,0,1,0,0,0,1, ldraw_lib__stud(realsolid)],
// 0
];
module ldraw_lib__s__3004s01(step=0, col=false, unit=2/5, alt=false, line=0.2, solid=!$preview)
    makepoly(ldraw_lib__s__3004s01(solid), step=step, col=col, unit=unit, alt=alt, line=line, solid=solid);
ldraw_lib__s__3004s01(line=0.2);
// file: s/3005s01.scad
use <../../lib.scad>
use <../../p/box4t.scad>
use <../../p/box5.scad>
use <../../p/stud.scad>
$fa=1; $fs=0.2;
function ldraw_lib__s__3005s01(realsolid=false) = [
// 0 ~Brick  1 x  1 without Front Face
// 0 Name: s\3005s01.dat
// 0 Author: John Riley [jriley]
// 0 !LDRAW_ORG Subpart UPDATE 2004-01
// 0 !LICENSE Licensed under CC BY 2.0 and CC BY 4.0 : see CAreadme.txt
// 
// 0 BFC CERTIFY CCW
  [0,"BFC","CERTIFY"],
  [0,"BFC","CCW"],
// 
// 0 !HISTORY 2003-09-07 [jriley] BFCed & Subfiled
// 0 !HISTORY 2004-03-02 [PTadmin] Official Update 2004-01
// 0 !HISTORY 2007-08-29 [PTadmin] Header formatted for Contributor Agreement
// 0 !HISTORY 2008-07-01 [PTadmin] Official Update 2008-01
// 
// 
// 0 BFC INVERTNEXT
  [0,"BFC","INVERTNEXT"],
// 1 16 0 24 0 0 0 6 0 -20 0 -6 0 0 box5.dat
  [1,16,0,24,0,0,0,6,0,-20,0,-6,0,0, ldraw_lib__box5(realsolid)],
// 4 16 10 24 -10 6 24 -6 6 24 6 10 24 10
  [4,16,10,24,-10,6,24,-6,6,24,6,10,24,10],
// 4 16 10 24 10 6 24 6 -6 24 6 -10 24 10
  [4,16,10,24,10,6,24,6,-6,24,6,-10,24,10],
// 4 16 -10 24 10 -6 24 6 -6 24 -6 -10 24 -10
  [4,16,-10,24,10,-6,24,6,-6,24,-6,-10,24,-10],
// 4 16 -10 24 -10 -6 24 -6 6 24 -6 10 24 -10
  [4,16,-10,24,-10,-6,24,-6,6,24,-6,10,24,-10],
// 1 16 0 24 0 10 0 0 0 -24 0 0 0 10 box4t.dat
  [1,16,0,24,0,10,0,0,0,-24,0,0,0,10, ldraw_lib__box4t(realsolid)],
// 1 16 0 0 0 0 0 1 0 1 0 -1 0 0 stud.dat
  [1,16,0,0,0,0,0,1,0,1,0,-1,0,0, ldraw_lib__stud(realsolid)],
// 0
];
module ldraw_lib__s__3005s01(step=0, col=false, unit=2/5, alt=false, line=0.2, solid=!$preview)
    makepoly(ldraw_lib__s__3005s01(solid), step=step, col=col, unit=unit, alt=alt, line=line, solid=solid);
ldraw_lib__s__3005s01(line=0.2);
// file: 3004.scad
use <../lib.scad>
use <s/3004s01.scad>
$fa=1; $fs=0.2;
function ldraw_lib__3004(realsolid=false) = [
// 0 Brick  1 x  2
// 0 Name: 3004.dat
// 0 Author: James Jessiman
// 0 !LDRAW_ORG Part UPDATE 2022-05
// 0 !LICENSE Licensed under CC BY 2.0 and CC BY 4.0 : see CAreadme.txt
// 
// 0 BFC CERTIFY CCW
  [0,"BFC","CERTIFY"],
  [0,"BFC","CCW"],
// 
// 0 !HISTORY 2001-10-26 [PTadmin] Official Update 2001-01
// 0 !HISTORY 2002-05-07 {unknown} BFC Certification
// 0 !HISTORY 2002-06-11 [PTadmin] Official Update 2002-03
// 0 !HISTORY 2007-05-07 [PTadmin] Header formatted for Contributor Agreement
// 0 !HISTORY 2008-07-01 [PTadmin] Official Update 2008-01
// 0 !HISTORY 2022-08-04 [MagFors] Using subfile
// 0 !HISTORY 2022-09-15 [PTadmin] Official Update 2022-05
// 
// 
// 1 16 0 0 0 1 0 0 0 1 0 0 0 1 s\3004s01.dat
  [1,16,0,0,0,1,0,0,0,1,0,0,0,1, ldraw_lib__s__3004s01(realsolid)],
// 4 16 -20 24 -10 20 24 -10 20 0 -10 -20 0 -10
  [4,16,-20,24,-10,20,24,-10,20,0,-10,-20,0,-10],
];
module ldraw_lib__3004(step=0, col=false, unit=2/5, alt=false, line=0.2, solid=!$preview)
    makepoly(ldraw_lib__3004(solid), step=step, col=col, unit=unit, alt=alt, line=line, solid=solid);
ldraw_lib__3004(line=0.2);
// file: 3005ptj.scad
use <../lib.scad>
use <s/3005s01.scad>
$fa=1; $fs=0.2;
function ldraw_lib__3005ptj(realsolid=false) = [
// 0 Brick  1 x  1 with Blue "J" Pattern
// 0 Name: 3005ptj.dat
// 0 Author: Tore Eriksson [Tore_Eriksson]
// 0 !LDRAW_ORG Part UPDATE 2004-02
// 0 !LICENSE Licensed under CC BY 2.0 and CC BY 4.0 : see CAreadme.txt
// 
// 0 BFC CERTIFY CCW
  [0,"BFC","CERTIFY"],
  [0,"BFC","CCW"],
// 
// 0 !HISTORY 2003-12-09 [Steffen] made use of existing subfile
// 0 !HISTORY 2003-12-11 [Tore_Eriksson] fixed overlapping quads
// 0 !HISTORY 2003-12-11 [Steffen] BFCed
// 0 !HISTORY 2004-04-22 [PTadmin] Official Update 2004-02
// 0 !HISTORY 2007-05-11 [PTadmin] Header formatted for Contributor Agreement
// 0 !HISTORY 2008-07-01 [PTadmin] Official Update 2008-01
// 
// 
// 1 16 0 0 0 1 0 0 0 1 0 0 0 1 s\3005s01.dat
  [1,16,0,0,0,1,0,0,0,1,0,0,0,1, ldraw_lib__s__3005s01(realsolid)],
// 
// 4 1 5 5 -10 3 5 -10 3 13.5 -10 5 13.5 -10
  [4,1,5,5,-10,3,5,-10,3,13.5,-10,5,13.5,-10],
// 4 1 -4.38905 17.389 -10 -2.60485 18.5814 -10 -1.83945 16.7337 -10 -2.97485 15.9748 -10
  [4,1,-4.38905,17.389,-10,-2.60485,18.5814,-10,-1.83945,16.7337,-10,-2.97485,15.9748,-10],
// 3 1 -2.97485 15.9748 -10 -3.73365 14.8394 -10 -4.38905 17.389 -10
  [3,1,-2.97485,15.9748,-10,-3.73365,14.8394,-10,-4.38905,17.389,-10],
// 4 1 -0.5 17 -10 -1.83945 16.7337 -10 -2.60485 18.5814 -10 -0.5 19 -10
  [4,1,-0.5,17,-10,-1.83945,16.7337,-10,-2.60485,18.5814,-10,-0.5,19,-10],
// 4 1 0.83945 16.7337 -10 -0.5 17 -10 -0.5 19 -10 1.60485 18.5814 -10
  [4,1,0.83945,16.7337,-10,-0.5,17,-10,-0.5,19,-10,1.60485,18.5814,-10],
// 4 1 1.97485 15.9748 -10 0.83945 16.7337 -10 1.60485 18.5814 -10 3.38905 17.389 -10
  [4,1,1.97485,15.9748,-10,0.83945,16.7337,-10,1.60485,18.5814,-10,3.38905,17.389,-10],
// 4 1 2.73365 14.8394 -10 1.97485 15.9748 -10 3.38905 17.389 -10 4.58145 15.6048 -10
  [4,1,2.73365,14.8394,-10,1.97485,15.9748,-10,3.38905,17.389,-10,4.58145,15.6048,-10],
// 4 1 3 13.5 -10 2.73365 14.8394 -10 4.58145 15.6048 -10 5 13.5 -10
  [4,1,3,13.5,-10,2.73365,14.8394,-10,4.58145,15.6048,-10,5,13.5,-10],
// 3 16 -10 24 -10 -4.38905 17.389 -10 -10 12 -10
  [3,16,-10,24,-10,-4.38905,17.389,-10,-10,12,-10],
// 3 16 -10 12 -10 -4.38905 17.389 -10 -3.73365 14.8394 -10
  [3,16,-10,12,-10,-4.38905,17.389,-10,-3.73365,14.8394,-10],
// 4 16 -10 12 -10 -3.73365 14.8394 -10 -0.5 13.5 -10 -10 0 -10
  [4,16,-10,12,-10,-3.73365,14.8394,-10,-0.5,13.5,-10,-10,0,-10],
// 4 16 -10 0 -10 -0.5 13.5 -10 3 5 -10 0 0 -10
  [4,16,-10,0,-10,-0.5,13.5,-10,3,5,-10,0,0,-10],
// 4 16 0 0 -10 3 5 -10 5 5 -10 10 0 -10
  [4,16,0,0,-10,3,5,-10,5,5,-10,10,0,-10],
// 4 16 10 0 -10 5 5 -10 5 13.5 -10 10 24 -10
  [4,16,10,0,-10,5,5,-10,5,13.5,-10,10,24,-10],
// 3 16 10 24 -10 5 13.5 -10 4.58145 15.6048 -10
  [3,16,10,24,-10,5,13.5,-10,4.58145,15.6048,-10],
// 3 16 10 24 -10 4.58145 15.6048 -10 3.38905 17.389 -10
  [3,16,10,24,-10,4.58145,15.6048,-10,3.38905,17.389,-10],
// 4 16 -2.60485 18.5814 -10 -4.38905 17.389 -10 -10 24 -10 0 24 -10
  [4,16,-2.60485,18.5814,-10,-4.38905,17.389,-10,-10,24,-10,0,24,-10],
// 3 16 -0.5 19 -10 -2.60485 18.5814 -10 0 24 -10
  [3,16,-0.5,19,-10,-2.60485,18.5814,-10,0,24,-10],
// 3 16 1.60485 18.5814 -10 -0.5 19 -10 0 24 -10
  [3,16,1.60485,18.5814,-10,-0.5,19,-10,0,24,-10],
// 4 16 3.38905 17.389 -10 1.60485 18.5814 -10 0 24 -10 10 24 -10
  [4,16,3.38905,17.389,-10,1.60485,18.5814,-10,0,24,-10,10,24,-10],
// 3 16 -0.5 13.5 -10 -2.97485 15.9748 -10 -1.83945 16.7337 -10
  [3,16,-0.5,13.5,-10,-2.97485,15.9748,-10,-1.83945,16.7337,-10],
// 3 16 -3.73365 14.8394 -10 -2.97485 15.9748 -10 -0.5 13.5 -10
  [3,16,-3.73365,14.8394,-10,-2.97485,15.9748,-10,-0.5,13.5,-10],
// 4 16 -0.5 13.5 -10 -1.83945 16.7337 -10 -0.5 17 -10 0.83945 16.7337 -10
  [4,16,-0.5,13.5,-10,-1.83945,16.7337,-10,-0.5,17,-10,0.83945,16.7337,-10],
// 4 16 -0.5 13.5 -10 0.83945 16.7337 -10 1.97485 15.9748 -10 2.73365 14.8394 -10
  [4,16,-0.5,13.5,-10,0.83945,16.7337,-10,1.97485,15.9748,-10,2.73365,14.8394,-10],
// 4 16 -0.5 13.5 -10 2.73365 14.8394 -10 3 13.5 -10 3 5 -10
  [4,16,-0.5,13.5,-10,2.73365,14.8394,-10,3,13.5,-10,3,5,-10],
// 0
];
module ldraw_lib__3005ptj(step=0, col=false, unit=2/5, alt=false, line=0.2, solid=!$preview)
    makepoly(ldraw_lib__3005ptj(solid), step=step, col=col, unit=unit, alt=alt, line=line, solid=solid);
ldraw_lib__3005ptj(line=0.2);
// main file
use <../lib.scad>
use <3005ptj.scad>
$fa=1; $fs=0.2;
function ldraw_lib__3005_j(realsolid=false) = [
// 0 ~Moved to 3005ptj
// 0 Name: 3005-j.dat
// 0 Author: [PTadmin]
// 0 !LDRAW_ORG Part UPDATE 2004-02
// 0 !LICENSE Licensed under CC BY 4.0 : see CAreadme.txt
// 
// 0 BFC CERTIFY CCW
  [0,"BFC","CERTIFY"],
  [0,"BFC","CCW"],
// 
// 0 !HISTORY 1998-12-15 [PTadmin] Official Update 1998-10
// 0 !HISTORY 2004-04-22 [PTadmin] Official Update 2004-02
// 0 !HISTORY 2007-05-11 [PTadmin] Header formatted for Contributor Agreement
// 0 !HISTORY 2008-07-01 [PTadmin] Official Update 2008-01
// 
// 
// 1 16 0 0 0 1 0 0 0 1 0 0 0 1 3005ptj.dat
  [1,16,0,0,0,1,0,0,0,1,0,0,0,1, ldraw_lib__3005ptj(realsolid)],
];
module ldraw_lib__3005_j(step=0, col=false, unit=2/5, alt=false, line=0.2, solid=!$preview)
    makepoly(ldraw_lib__3005_j(solid), step=step, col=col, unit=unit, alt=alt, line=line, solid=solid);
ldraw_lib__3005_j(line=0.2);
